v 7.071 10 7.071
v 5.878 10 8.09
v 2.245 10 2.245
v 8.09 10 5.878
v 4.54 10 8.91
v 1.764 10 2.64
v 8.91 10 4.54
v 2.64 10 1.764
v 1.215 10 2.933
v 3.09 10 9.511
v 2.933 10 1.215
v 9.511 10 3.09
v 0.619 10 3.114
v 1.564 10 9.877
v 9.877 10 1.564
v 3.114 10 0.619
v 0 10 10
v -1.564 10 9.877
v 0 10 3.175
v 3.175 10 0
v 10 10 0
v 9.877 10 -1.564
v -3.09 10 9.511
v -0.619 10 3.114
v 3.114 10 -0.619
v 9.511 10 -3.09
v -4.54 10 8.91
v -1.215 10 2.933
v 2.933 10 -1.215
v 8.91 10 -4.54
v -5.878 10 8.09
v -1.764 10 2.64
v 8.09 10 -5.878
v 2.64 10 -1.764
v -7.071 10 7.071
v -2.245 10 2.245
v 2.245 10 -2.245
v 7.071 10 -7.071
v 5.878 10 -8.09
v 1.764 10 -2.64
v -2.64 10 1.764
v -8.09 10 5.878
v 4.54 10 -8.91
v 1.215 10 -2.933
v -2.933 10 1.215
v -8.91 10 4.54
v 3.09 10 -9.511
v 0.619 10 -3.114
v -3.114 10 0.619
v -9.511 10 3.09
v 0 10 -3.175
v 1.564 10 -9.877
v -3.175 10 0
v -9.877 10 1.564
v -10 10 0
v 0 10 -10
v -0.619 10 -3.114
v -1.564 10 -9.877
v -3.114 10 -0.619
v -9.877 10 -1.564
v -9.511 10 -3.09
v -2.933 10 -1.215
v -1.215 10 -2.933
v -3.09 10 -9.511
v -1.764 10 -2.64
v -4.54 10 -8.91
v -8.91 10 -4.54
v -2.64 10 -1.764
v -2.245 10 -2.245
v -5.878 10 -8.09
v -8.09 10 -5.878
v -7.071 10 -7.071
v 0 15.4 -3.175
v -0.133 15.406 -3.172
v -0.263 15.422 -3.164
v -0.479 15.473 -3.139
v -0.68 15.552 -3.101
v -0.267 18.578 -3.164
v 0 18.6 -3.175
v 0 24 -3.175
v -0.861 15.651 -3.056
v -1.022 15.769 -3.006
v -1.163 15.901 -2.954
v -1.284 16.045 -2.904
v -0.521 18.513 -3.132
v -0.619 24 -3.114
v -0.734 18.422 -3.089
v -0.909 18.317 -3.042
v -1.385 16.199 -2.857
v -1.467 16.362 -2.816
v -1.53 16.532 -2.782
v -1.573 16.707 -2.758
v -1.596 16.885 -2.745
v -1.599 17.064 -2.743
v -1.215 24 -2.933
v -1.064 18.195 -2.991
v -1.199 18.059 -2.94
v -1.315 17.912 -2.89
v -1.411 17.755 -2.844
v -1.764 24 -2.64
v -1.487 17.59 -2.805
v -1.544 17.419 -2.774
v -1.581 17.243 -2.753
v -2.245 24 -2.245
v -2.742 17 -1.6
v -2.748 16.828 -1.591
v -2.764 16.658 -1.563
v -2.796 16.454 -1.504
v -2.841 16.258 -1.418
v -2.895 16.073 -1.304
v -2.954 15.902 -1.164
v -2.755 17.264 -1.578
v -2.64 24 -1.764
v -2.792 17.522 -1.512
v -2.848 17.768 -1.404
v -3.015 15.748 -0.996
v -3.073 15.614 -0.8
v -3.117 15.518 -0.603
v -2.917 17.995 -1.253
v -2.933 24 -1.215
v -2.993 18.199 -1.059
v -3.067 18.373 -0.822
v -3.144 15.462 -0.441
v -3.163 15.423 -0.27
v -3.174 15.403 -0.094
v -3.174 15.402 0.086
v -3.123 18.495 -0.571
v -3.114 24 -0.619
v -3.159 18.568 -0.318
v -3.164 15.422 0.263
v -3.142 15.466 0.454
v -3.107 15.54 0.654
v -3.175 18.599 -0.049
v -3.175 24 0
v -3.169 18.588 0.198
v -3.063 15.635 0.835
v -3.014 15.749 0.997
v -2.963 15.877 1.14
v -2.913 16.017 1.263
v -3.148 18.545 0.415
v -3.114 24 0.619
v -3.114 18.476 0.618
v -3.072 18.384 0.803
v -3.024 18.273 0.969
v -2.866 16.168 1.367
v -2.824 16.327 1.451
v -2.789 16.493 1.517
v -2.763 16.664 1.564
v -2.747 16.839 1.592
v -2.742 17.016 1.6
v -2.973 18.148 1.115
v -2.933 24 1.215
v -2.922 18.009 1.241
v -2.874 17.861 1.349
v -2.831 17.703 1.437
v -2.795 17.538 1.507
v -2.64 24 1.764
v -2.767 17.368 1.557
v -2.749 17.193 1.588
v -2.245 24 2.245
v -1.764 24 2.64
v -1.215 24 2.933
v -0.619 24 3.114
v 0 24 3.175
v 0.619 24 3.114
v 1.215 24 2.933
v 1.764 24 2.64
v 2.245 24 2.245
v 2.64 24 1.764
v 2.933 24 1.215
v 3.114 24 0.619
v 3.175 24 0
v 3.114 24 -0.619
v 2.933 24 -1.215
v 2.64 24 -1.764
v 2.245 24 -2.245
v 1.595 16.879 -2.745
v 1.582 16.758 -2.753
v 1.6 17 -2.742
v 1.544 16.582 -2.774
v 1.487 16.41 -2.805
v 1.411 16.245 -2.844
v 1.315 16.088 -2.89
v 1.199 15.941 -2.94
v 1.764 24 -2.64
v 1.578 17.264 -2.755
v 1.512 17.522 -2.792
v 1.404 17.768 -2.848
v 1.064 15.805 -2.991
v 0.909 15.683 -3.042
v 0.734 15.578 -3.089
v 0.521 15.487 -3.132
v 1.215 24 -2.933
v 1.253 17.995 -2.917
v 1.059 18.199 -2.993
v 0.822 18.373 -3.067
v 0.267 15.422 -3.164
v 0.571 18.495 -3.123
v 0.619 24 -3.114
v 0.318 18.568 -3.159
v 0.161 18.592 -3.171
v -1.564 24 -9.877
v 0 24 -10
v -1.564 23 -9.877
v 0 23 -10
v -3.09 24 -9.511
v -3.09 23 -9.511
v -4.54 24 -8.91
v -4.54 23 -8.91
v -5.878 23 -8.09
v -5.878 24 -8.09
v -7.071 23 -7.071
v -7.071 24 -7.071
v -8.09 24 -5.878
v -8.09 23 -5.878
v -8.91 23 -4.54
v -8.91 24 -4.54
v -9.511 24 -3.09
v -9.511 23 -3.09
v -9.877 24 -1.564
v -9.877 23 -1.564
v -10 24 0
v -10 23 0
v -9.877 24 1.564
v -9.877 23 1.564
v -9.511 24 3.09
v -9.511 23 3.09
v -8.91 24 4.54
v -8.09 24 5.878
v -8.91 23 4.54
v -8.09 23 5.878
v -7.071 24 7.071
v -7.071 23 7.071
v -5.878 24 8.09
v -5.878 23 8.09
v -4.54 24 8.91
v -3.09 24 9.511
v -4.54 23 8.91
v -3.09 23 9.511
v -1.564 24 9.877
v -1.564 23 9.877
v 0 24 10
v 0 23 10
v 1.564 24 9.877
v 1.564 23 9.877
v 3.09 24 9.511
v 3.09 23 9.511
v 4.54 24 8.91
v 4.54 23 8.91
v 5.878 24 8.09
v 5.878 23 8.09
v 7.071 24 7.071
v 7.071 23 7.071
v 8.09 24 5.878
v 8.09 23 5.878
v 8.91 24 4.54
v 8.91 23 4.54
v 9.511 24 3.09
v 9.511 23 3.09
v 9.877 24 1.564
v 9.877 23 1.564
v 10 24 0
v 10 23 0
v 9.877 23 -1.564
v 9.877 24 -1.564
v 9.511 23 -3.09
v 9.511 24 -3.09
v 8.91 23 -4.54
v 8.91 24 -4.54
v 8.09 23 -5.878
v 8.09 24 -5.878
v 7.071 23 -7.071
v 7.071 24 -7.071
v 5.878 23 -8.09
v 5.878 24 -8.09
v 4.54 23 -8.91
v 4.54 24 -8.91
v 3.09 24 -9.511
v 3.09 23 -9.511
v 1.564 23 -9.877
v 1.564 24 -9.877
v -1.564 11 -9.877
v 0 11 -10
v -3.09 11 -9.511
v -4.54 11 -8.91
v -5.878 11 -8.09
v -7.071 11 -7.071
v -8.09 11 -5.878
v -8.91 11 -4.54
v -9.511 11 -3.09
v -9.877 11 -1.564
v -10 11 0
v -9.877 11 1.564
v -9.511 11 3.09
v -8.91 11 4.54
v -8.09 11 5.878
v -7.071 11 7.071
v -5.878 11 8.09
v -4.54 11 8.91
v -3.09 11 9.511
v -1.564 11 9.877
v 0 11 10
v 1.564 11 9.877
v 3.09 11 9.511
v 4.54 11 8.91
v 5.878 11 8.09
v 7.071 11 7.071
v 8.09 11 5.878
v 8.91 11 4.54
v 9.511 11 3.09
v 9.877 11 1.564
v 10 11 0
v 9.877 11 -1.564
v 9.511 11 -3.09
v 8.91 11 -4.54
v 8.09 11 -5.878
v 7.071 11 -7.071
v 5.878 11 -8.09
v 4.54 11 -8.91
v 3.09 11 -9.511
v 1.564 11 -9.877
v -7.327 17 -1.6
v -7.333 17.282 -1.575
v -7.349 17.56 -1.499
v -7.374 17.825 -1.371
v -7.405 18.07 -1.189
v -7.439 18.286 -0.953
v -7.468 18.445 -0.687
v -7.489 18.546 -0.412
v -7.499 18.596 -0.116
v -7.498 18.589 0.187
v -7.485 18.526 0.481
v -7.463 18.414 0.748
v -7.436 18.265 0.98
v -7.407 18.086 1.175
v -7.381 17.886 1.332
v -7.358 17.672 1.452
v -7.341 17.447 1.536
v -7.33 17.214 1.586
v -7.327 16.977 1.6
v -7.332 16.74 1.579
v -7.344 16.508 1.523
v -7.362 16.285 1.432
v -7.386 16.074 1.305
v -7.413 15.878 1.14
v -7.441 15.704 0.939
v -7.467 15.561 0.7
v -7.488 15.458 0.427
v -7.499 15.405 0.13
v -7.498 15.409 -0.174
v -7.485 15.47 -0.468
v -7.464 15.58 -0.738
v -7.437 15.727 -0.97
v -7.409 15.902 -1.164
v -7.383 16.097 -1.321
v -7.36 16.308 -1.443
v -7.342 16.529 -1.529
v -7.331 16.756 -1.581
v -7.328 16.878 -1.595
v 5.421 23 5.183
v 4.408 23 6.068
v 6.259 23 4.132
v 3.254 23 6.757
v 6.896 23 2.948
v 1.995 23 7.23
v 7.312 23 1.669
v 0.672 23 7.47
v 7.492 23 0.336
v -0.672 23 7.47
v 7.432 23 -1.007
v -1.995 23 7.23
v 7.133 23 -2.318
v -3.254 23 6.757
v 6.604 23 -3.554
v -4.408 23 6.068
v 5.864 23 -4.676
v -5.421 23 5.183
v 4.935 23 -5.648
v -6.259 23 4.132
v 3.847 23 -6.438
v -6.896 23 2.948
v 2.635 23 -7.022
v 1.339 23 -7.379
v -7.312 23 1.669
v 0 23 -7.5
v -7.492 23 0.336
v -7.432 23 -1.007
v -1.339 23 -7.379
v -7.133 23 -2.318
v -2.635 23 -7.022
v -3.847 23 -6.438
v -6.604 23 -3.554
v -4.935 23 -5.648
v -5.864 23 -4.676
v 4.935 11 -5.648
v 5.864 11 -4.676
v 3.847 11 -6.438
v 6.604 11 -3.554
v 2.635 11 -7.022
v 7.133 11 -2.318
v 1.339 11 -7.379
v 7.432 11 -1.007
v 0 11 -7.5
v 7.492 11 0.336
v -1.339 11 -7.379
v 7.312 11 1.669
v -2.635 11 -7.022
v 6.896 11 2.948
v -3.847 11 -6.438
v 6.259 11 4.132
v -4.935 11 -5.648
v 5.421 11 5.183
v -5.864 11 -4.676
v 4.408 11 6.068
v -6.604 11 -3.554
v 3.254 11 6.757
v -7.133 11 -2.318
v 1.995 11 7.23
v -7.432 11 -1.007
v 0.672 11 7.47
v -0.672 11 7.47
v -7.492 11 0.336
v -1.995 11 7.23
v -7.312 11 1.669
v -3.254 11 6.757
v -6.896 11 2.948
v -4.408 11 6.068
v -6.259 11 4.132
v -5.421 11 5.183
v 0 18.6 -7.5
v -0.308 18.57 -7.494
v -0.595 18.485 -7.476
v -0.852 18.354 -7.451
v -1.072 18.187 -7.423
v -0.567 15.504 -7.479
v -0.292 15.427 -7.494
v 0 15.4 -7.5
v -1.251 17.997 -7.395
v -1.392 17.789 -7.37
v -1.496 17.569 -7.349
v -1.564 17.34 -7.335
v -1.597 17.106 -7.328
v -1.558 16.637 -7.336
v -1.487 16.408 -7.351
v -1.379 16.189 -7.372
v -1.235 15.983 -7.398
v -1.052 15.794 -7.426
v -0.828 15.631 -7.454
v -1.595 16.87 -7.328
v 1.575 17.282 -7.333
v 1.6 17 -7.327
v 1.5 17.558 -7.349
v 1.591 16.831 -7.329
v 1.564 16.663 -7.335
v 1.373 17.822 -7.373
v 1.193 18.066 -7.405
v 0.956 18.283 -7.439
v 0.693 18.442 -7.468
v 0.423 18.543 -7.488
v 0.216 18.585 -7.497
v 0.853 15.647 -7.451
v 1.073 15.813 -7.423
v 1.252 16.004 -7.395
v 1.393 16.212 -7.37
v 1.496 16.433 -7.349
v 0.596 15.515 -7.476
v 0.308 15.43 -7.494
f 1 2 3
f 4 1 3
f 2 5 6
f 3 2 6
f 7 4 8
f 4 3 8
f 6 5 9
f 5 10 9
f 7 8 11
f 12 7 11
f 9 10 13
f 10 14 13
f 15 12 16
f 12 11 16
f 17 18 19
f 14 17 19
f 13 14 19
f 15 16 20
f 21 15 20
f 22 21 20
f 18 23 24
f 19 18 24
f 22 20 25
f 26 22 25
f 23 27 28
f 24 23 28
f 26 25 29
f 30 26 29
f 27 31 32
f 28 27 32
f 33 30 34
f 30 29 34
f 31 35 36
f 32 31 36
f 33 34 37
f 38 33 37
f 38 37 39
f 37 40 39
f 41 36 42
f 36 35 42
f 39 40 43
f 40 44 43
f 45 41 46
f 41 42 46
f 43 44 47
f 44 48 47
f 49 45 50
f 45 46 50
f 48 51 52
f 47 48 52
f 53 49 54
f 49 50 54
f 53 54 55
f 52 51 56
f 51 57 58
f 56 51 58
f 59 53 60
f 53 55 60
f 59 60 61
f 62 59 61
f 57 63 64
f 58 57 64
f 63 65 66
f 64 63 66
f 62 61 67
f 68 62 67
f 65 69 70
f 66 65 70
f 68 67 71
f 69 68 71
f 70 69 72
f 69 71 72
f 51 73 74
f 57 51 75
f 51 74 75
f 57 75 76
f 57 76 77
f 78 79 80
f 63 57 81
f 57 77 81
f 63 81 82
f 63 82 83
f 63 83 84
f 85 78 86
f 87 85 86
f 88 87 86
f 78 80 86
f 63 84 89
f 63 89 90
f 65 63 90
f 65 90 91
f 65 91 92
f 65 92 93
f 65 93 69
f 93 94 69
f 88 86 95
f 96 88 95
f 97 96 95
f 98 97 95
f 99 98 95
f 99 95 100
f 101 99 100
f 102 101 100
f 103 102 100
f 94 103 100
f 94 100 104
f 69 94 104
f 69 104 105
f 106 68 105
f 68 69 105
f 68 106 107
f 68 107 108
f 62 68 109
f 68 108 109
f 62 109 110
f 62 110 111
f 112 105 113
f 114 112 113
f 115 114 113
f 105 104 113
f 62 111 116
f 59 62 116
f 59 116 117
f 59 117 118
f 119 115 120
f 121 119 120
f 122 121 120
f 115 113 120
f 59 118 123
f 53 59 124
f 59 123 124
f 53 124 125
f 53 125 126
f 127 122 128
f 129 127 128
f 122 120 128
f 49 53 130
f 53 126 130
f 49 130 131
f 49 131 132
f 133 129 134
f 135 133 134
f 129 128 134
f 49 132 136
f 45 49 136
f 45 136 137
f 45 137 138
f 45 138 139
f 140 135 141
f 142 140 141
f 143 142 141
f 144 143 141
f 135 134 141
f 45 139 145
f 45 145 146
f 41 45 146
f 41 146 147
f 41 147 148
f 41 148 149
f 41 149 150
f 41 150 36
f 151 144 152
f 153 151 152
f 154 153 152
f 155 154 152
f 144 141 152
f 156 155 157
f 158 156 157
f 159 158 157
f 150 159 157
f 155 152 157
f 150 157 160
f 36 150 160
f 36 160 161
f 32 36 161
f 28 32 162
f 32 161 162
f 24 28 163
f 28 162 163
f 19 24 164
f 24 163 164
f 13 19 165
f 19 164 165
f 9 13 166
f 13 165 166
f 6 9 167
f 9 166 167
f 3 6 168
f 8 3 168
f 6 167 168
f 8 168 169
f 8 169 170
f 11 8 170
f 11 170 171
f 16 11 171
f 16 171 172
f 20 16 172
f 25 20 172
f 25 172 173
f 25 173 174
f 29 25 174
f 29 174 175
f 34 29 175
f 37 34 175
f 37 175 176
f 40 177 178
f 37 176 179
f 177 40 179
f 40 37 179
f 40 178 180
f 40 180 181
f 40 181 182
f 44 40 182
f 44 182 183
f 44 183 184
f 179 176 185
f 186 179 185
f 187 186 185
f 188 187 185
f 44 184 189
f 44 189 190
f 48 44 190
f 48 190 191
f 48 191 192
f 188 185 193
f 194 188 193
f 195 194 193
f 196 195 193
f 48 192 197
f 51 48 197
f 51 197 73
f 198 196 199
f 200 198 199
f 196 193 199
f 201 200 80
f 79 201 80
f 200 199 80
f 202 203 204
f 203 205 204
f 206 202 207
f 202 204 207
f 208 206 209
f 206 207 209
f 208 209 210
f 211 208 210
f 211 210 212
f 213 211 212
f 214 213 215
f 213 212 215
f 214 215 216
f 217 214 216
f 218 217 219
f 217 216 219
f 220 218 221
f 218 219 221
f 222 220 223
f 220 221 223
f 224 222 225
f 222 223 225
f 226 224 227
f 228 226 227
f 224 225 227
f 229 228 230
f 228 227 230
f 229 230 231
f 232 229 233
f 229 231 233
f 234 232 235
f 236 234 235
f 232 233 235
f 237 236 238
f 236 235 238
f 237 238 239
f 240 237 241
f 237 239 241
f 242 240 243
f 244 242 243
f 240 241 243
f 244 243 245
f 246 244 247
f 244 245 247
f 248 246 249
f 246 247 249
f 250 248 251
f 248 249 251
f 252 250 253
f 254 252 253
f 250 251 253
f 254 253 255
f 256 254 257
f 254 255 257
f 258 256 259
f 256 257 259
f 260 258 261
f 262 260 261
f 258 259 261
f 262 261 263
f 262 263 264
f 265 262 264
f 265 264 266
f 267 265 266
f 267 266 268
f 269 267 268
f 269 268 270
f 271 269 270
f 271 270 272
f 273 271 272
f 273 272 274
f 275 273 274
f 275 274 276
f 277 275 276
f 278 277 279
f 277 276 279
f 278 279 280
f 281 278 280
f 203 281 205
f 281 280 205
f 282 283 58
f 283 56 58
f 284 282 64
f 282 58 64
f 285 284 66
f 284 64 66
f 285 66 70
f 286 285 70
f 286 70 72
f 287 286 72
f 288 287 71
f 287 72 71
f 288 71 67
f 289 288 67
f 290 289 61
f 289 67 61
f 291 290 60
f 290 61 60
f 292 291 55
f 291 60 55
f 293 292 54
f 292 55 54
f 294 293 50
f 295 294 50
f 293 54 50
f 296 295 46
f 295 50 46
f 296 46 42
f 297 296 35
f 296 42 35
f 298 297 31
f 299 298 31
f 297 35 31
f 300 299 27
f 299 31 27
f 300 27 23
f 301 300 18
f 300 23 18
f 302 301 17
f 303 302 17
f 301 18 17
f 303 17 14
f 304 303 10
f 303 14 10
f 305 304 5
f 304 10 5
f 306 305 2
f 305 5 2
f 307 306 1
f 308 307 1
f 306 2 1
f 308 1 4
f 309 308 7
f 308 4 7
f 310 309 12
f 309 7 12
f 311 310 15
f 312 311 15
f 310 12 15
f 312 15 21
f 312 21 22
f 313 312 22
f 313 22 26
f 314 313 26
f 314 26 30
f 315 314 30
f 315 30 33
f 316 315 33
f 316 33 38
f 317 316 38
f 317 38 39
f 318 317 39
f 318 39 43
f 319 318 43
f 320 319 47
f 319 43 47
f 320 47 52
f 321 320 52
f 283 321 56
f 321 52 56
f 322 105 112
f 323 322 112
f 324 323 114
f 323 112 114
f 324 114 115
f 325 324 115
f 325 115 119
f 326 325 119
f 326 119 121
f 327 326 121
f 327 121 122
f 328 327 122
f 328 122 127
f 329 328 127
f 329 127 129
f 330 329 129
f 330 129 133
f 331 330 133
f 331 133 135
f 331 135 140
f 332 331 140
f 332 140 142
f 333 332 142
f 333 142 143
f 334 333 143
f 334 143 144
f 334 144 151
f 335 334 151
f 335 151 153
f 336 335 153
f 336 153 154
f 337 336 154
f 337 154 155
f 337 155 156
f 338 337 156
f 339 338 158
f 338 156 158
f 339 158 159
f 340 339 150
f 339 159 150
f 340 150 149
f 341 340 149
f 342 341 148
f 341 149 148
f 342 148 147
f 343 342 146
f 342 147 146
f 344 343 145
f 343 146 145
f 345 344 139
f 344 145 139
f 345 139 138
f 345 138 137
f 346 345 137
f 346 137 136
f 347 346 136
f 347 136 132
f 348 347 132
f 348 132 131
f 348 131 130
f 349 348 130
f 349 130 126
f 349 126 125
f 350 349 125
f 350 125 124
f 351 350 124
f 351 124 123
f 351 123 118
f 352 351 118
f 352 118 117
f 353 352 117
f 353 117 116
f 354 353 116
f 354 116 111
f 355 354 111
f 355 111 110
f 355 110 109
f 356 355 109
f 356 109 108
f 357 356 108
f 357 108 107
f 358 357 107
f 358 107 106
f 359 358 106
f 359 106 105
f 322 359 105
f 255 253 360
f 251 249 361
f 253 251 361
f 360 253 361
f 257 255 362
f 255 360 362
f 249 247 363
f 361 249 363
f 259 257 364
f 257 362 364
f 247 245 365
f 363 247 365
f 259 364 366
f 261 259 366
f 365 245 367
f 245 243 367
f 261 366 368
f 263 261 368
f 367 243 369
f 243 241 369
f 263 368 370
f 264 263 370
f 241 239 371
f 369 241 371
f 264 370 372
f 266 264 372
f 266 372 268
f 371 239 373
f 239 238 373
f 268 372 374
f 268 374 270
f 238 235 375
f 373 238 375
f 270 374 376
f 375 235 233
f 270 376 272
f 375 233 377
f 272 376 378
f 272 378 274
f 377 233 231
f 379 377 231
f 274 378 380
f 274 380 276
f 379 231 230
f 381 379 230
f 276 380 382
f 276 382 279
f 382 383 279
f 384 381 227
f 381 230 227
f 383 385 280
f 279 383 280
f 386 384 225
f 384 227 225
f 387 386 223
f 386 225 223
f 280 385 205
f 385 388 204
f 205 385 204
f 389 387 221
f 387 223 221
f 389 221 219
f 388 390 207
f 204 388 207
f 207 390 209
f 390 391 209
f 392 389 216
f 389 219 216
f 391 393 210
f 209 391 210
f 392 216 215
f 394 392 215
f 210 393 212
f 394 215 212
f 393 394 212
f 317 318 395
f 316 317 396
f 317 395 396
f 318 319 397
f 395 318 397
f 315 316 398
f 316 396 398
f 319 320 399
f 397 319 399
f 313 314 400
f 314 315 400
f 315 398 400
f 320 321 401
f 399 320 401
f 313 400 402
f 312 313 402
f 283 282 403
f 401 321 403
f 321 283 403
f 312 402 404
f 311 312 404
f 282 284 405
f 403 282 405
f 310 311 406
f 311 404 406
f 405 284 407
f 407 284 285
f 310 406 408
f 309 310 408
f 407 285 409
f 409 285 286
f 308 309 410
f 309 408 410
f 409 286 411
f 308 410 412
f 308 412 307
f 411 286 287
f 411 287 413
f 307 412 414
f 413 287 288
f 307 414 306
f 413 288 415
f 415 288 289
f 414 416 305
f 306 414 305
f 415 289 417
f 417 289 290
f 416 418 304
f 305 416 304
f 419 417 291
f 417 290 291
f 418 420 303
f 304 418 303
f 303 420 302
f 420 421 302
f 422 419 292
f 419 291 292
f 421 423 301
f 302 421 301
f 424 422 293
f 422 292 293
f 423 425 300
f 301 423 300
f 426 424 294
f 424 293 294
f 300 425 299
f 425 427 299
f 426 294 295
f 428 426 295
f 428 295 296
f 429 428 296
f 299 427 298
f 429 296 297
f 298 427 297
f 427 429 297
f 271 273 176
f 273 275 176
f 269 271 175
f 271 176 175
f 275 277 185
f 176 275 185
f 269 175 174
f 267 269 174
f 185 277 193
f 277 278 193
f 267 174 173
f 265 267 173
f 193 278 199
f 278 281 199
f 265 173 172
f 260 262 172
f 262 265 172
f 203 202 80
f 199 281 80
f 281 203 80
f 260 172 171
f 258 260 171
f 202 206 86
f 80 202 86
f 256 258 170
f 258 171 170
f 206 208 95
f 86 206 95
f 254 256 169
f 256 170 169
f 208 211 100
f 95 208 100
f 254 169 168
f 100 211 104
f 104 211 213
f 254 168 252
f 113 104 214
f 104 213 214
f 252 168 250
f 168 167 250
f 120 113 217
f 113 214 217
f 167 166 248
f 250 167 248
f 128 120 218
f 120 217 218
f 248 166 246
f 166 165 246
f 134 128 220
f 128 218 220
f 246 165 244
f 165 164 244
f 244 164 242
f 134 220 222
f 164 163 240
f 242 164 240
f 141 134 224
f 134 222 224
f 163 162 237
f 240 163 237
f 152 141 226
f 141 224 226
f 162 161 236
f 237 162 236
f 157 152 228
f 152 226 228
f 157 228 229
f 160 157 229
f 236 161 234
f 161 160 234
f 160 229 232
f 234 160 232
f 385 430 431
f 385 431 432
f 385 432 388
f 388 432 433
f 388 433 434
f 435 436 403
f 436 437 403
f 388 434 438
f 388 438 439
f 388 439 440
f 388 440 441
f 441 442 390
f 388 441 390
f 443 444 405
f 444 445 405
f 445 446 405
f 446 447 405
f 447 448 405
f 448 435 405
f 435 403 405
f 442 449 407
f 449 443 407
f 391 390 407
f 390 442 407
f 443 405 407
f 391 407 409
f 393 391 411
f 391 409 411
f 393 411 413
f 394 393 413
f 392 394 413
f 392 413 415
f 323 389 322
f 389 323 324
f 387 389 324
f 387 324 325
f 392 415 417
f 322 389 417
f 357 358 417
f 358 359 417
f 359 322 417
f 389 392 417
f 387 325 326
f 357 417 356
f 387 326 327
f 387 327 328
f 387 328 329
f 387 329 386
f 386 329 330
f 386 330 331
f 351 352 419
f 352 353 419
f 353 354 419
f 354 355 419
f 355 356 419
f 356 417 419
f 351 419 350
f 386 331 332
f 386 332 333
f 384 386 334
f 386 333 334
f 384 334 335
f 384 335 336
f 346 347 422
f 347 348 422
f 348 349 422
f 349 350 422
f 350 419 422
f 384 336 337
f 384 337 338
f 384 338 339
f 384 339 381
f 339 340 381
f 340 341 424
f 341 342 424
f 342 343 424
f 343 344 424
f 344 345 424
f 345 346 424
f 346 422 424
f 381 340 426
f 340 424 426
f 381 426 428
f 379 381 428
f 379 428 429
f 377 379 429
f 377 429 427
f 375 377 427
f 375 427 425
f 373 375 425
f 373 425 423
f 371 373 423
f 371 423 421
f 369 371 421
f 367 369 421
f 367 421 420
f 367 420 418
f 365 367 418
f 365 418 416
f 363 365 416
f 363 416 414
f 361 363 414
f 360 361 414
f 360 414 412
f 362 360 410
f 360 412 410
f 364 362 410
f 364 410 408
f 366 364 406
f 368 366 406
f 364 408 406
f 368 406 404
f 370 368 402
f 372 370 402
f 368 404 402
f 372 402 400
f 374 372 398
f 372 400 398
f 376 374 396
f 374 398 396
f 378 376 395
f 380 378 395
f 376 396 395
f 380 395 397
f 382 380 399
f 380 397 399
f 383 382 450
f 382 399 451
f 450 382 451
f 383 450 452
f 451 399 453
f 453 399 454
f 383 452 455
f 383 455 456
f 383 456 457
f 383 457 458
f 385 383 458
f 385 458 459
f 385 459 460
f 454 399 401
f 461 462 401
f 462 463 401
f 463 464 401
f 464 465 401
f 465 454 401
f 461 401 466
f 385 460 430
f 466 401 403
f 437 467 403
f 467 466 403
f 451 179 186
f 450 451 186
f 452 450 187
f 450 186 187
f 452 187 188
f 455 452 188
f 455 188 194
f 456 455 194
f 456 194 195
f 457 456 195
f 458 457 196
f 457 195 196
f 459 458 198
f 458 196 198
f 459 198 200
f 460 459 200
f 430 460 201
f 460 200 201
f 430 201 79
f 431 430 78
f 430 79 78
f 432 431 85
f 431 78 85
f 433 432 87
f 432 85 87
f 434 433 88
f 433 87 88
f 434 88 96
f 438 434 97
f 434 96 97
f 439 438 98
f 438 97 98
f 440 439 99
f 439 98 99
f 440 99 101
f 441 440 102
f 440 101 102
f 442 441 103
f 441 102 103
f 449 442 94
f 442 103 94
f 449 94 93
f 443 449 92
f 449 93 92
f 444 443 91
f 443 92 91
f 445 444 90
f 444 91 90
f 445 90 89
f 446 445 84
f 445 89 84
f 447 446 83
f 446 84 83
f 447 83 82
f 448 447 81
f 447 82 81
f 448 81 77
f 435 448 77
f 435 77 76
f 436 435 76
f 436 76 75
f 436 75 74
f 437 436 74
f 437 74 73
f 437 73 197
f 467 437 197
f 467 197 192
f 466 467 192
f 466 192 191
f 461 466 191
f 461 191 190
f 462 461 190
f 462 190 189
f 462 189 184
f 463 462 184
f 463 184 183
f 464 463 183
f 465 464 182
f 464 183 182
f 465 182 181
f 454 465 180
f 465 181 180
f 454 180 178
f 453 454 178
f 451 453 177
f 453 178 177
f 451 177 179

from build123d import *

# Parameters (mm, degrees)
CUT_EXTRUDE1_REACH      = 29.857
CUT_EXTRUDE1_END_RADIUS = 7.5
SKETCH2_R               = 1.6
CUT_EXTRUDE2_REACH      = 29.857
CUT_EXTRUDE2_END_RADIUS = 7.5
SKETCH3_R               = 1.6


with BuildPart() as part:
    # Sketch1 → Revolve1 (revolve)
    with BuildSketch(Plane.XY, mode=Mode.PRIVATE) as revolve1_sk:
        Polygon((-3.175, 10), (-3.175, 24), (-10, 24), (-10, 23), (-7.5, 23), (-7.5, 11), (-10, 11), (-10, 10), align=None)
    revolve(revolve1_sk.sketch.rotate(Axis((0, 0, 0), (0, 1, 0)), 270), axis=Axis((0, 0, 0), (0, 1, 0)))

    # Cut-Extrude1: up to this cylinder (the profile starts inside it)
    cut_extrude1_end = Plane(origin=(0, 17, 0), z_dir=(0, -1, 0)) * Cylinder(CUT_EXTRUDE1_END_RADIUS, 75.714, mode=Mode.PRIVATE)
    # Sketch2 → Cut-Extrude1 (cut, up to the surface)
    with BuildSketch(Plane.XY, mode=Mode.PRIVATE) as cut_extrude1_sk1:
        with Locations((0, 17)):
            Circle(SKETCH2_R)
    cut_extrude1_tool1 = extrude(cut_extrude1_sk1.sketch, amount=-CUT_EXTRUDE1_REACH, mode=Mode.PRIVATE) & cut_extrude1_end
    add(cut_extrude1_tool1.solids().sort_by_distance((0, 17, 0))[0], mode=Mode.SUBTRACT)

    # Cut-Extrude2: up to this cylinder (the profile starts inside it)
    cut_extrude2_end = Plane(origin=(0, 17, 0), z_dir=(0, -1, 0)) * Cylinder(CUT_EXTRUDE2_END_RADIUS, 75.714, mode=Mode.PRIVATE)
    # Sketch3 → Cut-Extrude2 (cut, up to the surface)
    with BuildSketch(Plane(origin=(0, 0, 0), x_dir=(0, 0, -1), z_dir=(1, 0, 0)), mode=Mode.PRIVATE) as cut_extrude2_sk1:
        with Locations((0, 17)):
            Circle(SKETCH3_R)
    cut_extrude2_tool1 = extrude(cut_extrude2_sk1.sketch, amount=-CUT_EXTRUDE2_REACH, mode=Mode.PRIVATE) & cut_extrude2_end
    add(cut_extrude2_tool1.solids().sort_by_distance((0, 17, 0))[0], mode=Mode.SUBTRACT)


solid = part.part
